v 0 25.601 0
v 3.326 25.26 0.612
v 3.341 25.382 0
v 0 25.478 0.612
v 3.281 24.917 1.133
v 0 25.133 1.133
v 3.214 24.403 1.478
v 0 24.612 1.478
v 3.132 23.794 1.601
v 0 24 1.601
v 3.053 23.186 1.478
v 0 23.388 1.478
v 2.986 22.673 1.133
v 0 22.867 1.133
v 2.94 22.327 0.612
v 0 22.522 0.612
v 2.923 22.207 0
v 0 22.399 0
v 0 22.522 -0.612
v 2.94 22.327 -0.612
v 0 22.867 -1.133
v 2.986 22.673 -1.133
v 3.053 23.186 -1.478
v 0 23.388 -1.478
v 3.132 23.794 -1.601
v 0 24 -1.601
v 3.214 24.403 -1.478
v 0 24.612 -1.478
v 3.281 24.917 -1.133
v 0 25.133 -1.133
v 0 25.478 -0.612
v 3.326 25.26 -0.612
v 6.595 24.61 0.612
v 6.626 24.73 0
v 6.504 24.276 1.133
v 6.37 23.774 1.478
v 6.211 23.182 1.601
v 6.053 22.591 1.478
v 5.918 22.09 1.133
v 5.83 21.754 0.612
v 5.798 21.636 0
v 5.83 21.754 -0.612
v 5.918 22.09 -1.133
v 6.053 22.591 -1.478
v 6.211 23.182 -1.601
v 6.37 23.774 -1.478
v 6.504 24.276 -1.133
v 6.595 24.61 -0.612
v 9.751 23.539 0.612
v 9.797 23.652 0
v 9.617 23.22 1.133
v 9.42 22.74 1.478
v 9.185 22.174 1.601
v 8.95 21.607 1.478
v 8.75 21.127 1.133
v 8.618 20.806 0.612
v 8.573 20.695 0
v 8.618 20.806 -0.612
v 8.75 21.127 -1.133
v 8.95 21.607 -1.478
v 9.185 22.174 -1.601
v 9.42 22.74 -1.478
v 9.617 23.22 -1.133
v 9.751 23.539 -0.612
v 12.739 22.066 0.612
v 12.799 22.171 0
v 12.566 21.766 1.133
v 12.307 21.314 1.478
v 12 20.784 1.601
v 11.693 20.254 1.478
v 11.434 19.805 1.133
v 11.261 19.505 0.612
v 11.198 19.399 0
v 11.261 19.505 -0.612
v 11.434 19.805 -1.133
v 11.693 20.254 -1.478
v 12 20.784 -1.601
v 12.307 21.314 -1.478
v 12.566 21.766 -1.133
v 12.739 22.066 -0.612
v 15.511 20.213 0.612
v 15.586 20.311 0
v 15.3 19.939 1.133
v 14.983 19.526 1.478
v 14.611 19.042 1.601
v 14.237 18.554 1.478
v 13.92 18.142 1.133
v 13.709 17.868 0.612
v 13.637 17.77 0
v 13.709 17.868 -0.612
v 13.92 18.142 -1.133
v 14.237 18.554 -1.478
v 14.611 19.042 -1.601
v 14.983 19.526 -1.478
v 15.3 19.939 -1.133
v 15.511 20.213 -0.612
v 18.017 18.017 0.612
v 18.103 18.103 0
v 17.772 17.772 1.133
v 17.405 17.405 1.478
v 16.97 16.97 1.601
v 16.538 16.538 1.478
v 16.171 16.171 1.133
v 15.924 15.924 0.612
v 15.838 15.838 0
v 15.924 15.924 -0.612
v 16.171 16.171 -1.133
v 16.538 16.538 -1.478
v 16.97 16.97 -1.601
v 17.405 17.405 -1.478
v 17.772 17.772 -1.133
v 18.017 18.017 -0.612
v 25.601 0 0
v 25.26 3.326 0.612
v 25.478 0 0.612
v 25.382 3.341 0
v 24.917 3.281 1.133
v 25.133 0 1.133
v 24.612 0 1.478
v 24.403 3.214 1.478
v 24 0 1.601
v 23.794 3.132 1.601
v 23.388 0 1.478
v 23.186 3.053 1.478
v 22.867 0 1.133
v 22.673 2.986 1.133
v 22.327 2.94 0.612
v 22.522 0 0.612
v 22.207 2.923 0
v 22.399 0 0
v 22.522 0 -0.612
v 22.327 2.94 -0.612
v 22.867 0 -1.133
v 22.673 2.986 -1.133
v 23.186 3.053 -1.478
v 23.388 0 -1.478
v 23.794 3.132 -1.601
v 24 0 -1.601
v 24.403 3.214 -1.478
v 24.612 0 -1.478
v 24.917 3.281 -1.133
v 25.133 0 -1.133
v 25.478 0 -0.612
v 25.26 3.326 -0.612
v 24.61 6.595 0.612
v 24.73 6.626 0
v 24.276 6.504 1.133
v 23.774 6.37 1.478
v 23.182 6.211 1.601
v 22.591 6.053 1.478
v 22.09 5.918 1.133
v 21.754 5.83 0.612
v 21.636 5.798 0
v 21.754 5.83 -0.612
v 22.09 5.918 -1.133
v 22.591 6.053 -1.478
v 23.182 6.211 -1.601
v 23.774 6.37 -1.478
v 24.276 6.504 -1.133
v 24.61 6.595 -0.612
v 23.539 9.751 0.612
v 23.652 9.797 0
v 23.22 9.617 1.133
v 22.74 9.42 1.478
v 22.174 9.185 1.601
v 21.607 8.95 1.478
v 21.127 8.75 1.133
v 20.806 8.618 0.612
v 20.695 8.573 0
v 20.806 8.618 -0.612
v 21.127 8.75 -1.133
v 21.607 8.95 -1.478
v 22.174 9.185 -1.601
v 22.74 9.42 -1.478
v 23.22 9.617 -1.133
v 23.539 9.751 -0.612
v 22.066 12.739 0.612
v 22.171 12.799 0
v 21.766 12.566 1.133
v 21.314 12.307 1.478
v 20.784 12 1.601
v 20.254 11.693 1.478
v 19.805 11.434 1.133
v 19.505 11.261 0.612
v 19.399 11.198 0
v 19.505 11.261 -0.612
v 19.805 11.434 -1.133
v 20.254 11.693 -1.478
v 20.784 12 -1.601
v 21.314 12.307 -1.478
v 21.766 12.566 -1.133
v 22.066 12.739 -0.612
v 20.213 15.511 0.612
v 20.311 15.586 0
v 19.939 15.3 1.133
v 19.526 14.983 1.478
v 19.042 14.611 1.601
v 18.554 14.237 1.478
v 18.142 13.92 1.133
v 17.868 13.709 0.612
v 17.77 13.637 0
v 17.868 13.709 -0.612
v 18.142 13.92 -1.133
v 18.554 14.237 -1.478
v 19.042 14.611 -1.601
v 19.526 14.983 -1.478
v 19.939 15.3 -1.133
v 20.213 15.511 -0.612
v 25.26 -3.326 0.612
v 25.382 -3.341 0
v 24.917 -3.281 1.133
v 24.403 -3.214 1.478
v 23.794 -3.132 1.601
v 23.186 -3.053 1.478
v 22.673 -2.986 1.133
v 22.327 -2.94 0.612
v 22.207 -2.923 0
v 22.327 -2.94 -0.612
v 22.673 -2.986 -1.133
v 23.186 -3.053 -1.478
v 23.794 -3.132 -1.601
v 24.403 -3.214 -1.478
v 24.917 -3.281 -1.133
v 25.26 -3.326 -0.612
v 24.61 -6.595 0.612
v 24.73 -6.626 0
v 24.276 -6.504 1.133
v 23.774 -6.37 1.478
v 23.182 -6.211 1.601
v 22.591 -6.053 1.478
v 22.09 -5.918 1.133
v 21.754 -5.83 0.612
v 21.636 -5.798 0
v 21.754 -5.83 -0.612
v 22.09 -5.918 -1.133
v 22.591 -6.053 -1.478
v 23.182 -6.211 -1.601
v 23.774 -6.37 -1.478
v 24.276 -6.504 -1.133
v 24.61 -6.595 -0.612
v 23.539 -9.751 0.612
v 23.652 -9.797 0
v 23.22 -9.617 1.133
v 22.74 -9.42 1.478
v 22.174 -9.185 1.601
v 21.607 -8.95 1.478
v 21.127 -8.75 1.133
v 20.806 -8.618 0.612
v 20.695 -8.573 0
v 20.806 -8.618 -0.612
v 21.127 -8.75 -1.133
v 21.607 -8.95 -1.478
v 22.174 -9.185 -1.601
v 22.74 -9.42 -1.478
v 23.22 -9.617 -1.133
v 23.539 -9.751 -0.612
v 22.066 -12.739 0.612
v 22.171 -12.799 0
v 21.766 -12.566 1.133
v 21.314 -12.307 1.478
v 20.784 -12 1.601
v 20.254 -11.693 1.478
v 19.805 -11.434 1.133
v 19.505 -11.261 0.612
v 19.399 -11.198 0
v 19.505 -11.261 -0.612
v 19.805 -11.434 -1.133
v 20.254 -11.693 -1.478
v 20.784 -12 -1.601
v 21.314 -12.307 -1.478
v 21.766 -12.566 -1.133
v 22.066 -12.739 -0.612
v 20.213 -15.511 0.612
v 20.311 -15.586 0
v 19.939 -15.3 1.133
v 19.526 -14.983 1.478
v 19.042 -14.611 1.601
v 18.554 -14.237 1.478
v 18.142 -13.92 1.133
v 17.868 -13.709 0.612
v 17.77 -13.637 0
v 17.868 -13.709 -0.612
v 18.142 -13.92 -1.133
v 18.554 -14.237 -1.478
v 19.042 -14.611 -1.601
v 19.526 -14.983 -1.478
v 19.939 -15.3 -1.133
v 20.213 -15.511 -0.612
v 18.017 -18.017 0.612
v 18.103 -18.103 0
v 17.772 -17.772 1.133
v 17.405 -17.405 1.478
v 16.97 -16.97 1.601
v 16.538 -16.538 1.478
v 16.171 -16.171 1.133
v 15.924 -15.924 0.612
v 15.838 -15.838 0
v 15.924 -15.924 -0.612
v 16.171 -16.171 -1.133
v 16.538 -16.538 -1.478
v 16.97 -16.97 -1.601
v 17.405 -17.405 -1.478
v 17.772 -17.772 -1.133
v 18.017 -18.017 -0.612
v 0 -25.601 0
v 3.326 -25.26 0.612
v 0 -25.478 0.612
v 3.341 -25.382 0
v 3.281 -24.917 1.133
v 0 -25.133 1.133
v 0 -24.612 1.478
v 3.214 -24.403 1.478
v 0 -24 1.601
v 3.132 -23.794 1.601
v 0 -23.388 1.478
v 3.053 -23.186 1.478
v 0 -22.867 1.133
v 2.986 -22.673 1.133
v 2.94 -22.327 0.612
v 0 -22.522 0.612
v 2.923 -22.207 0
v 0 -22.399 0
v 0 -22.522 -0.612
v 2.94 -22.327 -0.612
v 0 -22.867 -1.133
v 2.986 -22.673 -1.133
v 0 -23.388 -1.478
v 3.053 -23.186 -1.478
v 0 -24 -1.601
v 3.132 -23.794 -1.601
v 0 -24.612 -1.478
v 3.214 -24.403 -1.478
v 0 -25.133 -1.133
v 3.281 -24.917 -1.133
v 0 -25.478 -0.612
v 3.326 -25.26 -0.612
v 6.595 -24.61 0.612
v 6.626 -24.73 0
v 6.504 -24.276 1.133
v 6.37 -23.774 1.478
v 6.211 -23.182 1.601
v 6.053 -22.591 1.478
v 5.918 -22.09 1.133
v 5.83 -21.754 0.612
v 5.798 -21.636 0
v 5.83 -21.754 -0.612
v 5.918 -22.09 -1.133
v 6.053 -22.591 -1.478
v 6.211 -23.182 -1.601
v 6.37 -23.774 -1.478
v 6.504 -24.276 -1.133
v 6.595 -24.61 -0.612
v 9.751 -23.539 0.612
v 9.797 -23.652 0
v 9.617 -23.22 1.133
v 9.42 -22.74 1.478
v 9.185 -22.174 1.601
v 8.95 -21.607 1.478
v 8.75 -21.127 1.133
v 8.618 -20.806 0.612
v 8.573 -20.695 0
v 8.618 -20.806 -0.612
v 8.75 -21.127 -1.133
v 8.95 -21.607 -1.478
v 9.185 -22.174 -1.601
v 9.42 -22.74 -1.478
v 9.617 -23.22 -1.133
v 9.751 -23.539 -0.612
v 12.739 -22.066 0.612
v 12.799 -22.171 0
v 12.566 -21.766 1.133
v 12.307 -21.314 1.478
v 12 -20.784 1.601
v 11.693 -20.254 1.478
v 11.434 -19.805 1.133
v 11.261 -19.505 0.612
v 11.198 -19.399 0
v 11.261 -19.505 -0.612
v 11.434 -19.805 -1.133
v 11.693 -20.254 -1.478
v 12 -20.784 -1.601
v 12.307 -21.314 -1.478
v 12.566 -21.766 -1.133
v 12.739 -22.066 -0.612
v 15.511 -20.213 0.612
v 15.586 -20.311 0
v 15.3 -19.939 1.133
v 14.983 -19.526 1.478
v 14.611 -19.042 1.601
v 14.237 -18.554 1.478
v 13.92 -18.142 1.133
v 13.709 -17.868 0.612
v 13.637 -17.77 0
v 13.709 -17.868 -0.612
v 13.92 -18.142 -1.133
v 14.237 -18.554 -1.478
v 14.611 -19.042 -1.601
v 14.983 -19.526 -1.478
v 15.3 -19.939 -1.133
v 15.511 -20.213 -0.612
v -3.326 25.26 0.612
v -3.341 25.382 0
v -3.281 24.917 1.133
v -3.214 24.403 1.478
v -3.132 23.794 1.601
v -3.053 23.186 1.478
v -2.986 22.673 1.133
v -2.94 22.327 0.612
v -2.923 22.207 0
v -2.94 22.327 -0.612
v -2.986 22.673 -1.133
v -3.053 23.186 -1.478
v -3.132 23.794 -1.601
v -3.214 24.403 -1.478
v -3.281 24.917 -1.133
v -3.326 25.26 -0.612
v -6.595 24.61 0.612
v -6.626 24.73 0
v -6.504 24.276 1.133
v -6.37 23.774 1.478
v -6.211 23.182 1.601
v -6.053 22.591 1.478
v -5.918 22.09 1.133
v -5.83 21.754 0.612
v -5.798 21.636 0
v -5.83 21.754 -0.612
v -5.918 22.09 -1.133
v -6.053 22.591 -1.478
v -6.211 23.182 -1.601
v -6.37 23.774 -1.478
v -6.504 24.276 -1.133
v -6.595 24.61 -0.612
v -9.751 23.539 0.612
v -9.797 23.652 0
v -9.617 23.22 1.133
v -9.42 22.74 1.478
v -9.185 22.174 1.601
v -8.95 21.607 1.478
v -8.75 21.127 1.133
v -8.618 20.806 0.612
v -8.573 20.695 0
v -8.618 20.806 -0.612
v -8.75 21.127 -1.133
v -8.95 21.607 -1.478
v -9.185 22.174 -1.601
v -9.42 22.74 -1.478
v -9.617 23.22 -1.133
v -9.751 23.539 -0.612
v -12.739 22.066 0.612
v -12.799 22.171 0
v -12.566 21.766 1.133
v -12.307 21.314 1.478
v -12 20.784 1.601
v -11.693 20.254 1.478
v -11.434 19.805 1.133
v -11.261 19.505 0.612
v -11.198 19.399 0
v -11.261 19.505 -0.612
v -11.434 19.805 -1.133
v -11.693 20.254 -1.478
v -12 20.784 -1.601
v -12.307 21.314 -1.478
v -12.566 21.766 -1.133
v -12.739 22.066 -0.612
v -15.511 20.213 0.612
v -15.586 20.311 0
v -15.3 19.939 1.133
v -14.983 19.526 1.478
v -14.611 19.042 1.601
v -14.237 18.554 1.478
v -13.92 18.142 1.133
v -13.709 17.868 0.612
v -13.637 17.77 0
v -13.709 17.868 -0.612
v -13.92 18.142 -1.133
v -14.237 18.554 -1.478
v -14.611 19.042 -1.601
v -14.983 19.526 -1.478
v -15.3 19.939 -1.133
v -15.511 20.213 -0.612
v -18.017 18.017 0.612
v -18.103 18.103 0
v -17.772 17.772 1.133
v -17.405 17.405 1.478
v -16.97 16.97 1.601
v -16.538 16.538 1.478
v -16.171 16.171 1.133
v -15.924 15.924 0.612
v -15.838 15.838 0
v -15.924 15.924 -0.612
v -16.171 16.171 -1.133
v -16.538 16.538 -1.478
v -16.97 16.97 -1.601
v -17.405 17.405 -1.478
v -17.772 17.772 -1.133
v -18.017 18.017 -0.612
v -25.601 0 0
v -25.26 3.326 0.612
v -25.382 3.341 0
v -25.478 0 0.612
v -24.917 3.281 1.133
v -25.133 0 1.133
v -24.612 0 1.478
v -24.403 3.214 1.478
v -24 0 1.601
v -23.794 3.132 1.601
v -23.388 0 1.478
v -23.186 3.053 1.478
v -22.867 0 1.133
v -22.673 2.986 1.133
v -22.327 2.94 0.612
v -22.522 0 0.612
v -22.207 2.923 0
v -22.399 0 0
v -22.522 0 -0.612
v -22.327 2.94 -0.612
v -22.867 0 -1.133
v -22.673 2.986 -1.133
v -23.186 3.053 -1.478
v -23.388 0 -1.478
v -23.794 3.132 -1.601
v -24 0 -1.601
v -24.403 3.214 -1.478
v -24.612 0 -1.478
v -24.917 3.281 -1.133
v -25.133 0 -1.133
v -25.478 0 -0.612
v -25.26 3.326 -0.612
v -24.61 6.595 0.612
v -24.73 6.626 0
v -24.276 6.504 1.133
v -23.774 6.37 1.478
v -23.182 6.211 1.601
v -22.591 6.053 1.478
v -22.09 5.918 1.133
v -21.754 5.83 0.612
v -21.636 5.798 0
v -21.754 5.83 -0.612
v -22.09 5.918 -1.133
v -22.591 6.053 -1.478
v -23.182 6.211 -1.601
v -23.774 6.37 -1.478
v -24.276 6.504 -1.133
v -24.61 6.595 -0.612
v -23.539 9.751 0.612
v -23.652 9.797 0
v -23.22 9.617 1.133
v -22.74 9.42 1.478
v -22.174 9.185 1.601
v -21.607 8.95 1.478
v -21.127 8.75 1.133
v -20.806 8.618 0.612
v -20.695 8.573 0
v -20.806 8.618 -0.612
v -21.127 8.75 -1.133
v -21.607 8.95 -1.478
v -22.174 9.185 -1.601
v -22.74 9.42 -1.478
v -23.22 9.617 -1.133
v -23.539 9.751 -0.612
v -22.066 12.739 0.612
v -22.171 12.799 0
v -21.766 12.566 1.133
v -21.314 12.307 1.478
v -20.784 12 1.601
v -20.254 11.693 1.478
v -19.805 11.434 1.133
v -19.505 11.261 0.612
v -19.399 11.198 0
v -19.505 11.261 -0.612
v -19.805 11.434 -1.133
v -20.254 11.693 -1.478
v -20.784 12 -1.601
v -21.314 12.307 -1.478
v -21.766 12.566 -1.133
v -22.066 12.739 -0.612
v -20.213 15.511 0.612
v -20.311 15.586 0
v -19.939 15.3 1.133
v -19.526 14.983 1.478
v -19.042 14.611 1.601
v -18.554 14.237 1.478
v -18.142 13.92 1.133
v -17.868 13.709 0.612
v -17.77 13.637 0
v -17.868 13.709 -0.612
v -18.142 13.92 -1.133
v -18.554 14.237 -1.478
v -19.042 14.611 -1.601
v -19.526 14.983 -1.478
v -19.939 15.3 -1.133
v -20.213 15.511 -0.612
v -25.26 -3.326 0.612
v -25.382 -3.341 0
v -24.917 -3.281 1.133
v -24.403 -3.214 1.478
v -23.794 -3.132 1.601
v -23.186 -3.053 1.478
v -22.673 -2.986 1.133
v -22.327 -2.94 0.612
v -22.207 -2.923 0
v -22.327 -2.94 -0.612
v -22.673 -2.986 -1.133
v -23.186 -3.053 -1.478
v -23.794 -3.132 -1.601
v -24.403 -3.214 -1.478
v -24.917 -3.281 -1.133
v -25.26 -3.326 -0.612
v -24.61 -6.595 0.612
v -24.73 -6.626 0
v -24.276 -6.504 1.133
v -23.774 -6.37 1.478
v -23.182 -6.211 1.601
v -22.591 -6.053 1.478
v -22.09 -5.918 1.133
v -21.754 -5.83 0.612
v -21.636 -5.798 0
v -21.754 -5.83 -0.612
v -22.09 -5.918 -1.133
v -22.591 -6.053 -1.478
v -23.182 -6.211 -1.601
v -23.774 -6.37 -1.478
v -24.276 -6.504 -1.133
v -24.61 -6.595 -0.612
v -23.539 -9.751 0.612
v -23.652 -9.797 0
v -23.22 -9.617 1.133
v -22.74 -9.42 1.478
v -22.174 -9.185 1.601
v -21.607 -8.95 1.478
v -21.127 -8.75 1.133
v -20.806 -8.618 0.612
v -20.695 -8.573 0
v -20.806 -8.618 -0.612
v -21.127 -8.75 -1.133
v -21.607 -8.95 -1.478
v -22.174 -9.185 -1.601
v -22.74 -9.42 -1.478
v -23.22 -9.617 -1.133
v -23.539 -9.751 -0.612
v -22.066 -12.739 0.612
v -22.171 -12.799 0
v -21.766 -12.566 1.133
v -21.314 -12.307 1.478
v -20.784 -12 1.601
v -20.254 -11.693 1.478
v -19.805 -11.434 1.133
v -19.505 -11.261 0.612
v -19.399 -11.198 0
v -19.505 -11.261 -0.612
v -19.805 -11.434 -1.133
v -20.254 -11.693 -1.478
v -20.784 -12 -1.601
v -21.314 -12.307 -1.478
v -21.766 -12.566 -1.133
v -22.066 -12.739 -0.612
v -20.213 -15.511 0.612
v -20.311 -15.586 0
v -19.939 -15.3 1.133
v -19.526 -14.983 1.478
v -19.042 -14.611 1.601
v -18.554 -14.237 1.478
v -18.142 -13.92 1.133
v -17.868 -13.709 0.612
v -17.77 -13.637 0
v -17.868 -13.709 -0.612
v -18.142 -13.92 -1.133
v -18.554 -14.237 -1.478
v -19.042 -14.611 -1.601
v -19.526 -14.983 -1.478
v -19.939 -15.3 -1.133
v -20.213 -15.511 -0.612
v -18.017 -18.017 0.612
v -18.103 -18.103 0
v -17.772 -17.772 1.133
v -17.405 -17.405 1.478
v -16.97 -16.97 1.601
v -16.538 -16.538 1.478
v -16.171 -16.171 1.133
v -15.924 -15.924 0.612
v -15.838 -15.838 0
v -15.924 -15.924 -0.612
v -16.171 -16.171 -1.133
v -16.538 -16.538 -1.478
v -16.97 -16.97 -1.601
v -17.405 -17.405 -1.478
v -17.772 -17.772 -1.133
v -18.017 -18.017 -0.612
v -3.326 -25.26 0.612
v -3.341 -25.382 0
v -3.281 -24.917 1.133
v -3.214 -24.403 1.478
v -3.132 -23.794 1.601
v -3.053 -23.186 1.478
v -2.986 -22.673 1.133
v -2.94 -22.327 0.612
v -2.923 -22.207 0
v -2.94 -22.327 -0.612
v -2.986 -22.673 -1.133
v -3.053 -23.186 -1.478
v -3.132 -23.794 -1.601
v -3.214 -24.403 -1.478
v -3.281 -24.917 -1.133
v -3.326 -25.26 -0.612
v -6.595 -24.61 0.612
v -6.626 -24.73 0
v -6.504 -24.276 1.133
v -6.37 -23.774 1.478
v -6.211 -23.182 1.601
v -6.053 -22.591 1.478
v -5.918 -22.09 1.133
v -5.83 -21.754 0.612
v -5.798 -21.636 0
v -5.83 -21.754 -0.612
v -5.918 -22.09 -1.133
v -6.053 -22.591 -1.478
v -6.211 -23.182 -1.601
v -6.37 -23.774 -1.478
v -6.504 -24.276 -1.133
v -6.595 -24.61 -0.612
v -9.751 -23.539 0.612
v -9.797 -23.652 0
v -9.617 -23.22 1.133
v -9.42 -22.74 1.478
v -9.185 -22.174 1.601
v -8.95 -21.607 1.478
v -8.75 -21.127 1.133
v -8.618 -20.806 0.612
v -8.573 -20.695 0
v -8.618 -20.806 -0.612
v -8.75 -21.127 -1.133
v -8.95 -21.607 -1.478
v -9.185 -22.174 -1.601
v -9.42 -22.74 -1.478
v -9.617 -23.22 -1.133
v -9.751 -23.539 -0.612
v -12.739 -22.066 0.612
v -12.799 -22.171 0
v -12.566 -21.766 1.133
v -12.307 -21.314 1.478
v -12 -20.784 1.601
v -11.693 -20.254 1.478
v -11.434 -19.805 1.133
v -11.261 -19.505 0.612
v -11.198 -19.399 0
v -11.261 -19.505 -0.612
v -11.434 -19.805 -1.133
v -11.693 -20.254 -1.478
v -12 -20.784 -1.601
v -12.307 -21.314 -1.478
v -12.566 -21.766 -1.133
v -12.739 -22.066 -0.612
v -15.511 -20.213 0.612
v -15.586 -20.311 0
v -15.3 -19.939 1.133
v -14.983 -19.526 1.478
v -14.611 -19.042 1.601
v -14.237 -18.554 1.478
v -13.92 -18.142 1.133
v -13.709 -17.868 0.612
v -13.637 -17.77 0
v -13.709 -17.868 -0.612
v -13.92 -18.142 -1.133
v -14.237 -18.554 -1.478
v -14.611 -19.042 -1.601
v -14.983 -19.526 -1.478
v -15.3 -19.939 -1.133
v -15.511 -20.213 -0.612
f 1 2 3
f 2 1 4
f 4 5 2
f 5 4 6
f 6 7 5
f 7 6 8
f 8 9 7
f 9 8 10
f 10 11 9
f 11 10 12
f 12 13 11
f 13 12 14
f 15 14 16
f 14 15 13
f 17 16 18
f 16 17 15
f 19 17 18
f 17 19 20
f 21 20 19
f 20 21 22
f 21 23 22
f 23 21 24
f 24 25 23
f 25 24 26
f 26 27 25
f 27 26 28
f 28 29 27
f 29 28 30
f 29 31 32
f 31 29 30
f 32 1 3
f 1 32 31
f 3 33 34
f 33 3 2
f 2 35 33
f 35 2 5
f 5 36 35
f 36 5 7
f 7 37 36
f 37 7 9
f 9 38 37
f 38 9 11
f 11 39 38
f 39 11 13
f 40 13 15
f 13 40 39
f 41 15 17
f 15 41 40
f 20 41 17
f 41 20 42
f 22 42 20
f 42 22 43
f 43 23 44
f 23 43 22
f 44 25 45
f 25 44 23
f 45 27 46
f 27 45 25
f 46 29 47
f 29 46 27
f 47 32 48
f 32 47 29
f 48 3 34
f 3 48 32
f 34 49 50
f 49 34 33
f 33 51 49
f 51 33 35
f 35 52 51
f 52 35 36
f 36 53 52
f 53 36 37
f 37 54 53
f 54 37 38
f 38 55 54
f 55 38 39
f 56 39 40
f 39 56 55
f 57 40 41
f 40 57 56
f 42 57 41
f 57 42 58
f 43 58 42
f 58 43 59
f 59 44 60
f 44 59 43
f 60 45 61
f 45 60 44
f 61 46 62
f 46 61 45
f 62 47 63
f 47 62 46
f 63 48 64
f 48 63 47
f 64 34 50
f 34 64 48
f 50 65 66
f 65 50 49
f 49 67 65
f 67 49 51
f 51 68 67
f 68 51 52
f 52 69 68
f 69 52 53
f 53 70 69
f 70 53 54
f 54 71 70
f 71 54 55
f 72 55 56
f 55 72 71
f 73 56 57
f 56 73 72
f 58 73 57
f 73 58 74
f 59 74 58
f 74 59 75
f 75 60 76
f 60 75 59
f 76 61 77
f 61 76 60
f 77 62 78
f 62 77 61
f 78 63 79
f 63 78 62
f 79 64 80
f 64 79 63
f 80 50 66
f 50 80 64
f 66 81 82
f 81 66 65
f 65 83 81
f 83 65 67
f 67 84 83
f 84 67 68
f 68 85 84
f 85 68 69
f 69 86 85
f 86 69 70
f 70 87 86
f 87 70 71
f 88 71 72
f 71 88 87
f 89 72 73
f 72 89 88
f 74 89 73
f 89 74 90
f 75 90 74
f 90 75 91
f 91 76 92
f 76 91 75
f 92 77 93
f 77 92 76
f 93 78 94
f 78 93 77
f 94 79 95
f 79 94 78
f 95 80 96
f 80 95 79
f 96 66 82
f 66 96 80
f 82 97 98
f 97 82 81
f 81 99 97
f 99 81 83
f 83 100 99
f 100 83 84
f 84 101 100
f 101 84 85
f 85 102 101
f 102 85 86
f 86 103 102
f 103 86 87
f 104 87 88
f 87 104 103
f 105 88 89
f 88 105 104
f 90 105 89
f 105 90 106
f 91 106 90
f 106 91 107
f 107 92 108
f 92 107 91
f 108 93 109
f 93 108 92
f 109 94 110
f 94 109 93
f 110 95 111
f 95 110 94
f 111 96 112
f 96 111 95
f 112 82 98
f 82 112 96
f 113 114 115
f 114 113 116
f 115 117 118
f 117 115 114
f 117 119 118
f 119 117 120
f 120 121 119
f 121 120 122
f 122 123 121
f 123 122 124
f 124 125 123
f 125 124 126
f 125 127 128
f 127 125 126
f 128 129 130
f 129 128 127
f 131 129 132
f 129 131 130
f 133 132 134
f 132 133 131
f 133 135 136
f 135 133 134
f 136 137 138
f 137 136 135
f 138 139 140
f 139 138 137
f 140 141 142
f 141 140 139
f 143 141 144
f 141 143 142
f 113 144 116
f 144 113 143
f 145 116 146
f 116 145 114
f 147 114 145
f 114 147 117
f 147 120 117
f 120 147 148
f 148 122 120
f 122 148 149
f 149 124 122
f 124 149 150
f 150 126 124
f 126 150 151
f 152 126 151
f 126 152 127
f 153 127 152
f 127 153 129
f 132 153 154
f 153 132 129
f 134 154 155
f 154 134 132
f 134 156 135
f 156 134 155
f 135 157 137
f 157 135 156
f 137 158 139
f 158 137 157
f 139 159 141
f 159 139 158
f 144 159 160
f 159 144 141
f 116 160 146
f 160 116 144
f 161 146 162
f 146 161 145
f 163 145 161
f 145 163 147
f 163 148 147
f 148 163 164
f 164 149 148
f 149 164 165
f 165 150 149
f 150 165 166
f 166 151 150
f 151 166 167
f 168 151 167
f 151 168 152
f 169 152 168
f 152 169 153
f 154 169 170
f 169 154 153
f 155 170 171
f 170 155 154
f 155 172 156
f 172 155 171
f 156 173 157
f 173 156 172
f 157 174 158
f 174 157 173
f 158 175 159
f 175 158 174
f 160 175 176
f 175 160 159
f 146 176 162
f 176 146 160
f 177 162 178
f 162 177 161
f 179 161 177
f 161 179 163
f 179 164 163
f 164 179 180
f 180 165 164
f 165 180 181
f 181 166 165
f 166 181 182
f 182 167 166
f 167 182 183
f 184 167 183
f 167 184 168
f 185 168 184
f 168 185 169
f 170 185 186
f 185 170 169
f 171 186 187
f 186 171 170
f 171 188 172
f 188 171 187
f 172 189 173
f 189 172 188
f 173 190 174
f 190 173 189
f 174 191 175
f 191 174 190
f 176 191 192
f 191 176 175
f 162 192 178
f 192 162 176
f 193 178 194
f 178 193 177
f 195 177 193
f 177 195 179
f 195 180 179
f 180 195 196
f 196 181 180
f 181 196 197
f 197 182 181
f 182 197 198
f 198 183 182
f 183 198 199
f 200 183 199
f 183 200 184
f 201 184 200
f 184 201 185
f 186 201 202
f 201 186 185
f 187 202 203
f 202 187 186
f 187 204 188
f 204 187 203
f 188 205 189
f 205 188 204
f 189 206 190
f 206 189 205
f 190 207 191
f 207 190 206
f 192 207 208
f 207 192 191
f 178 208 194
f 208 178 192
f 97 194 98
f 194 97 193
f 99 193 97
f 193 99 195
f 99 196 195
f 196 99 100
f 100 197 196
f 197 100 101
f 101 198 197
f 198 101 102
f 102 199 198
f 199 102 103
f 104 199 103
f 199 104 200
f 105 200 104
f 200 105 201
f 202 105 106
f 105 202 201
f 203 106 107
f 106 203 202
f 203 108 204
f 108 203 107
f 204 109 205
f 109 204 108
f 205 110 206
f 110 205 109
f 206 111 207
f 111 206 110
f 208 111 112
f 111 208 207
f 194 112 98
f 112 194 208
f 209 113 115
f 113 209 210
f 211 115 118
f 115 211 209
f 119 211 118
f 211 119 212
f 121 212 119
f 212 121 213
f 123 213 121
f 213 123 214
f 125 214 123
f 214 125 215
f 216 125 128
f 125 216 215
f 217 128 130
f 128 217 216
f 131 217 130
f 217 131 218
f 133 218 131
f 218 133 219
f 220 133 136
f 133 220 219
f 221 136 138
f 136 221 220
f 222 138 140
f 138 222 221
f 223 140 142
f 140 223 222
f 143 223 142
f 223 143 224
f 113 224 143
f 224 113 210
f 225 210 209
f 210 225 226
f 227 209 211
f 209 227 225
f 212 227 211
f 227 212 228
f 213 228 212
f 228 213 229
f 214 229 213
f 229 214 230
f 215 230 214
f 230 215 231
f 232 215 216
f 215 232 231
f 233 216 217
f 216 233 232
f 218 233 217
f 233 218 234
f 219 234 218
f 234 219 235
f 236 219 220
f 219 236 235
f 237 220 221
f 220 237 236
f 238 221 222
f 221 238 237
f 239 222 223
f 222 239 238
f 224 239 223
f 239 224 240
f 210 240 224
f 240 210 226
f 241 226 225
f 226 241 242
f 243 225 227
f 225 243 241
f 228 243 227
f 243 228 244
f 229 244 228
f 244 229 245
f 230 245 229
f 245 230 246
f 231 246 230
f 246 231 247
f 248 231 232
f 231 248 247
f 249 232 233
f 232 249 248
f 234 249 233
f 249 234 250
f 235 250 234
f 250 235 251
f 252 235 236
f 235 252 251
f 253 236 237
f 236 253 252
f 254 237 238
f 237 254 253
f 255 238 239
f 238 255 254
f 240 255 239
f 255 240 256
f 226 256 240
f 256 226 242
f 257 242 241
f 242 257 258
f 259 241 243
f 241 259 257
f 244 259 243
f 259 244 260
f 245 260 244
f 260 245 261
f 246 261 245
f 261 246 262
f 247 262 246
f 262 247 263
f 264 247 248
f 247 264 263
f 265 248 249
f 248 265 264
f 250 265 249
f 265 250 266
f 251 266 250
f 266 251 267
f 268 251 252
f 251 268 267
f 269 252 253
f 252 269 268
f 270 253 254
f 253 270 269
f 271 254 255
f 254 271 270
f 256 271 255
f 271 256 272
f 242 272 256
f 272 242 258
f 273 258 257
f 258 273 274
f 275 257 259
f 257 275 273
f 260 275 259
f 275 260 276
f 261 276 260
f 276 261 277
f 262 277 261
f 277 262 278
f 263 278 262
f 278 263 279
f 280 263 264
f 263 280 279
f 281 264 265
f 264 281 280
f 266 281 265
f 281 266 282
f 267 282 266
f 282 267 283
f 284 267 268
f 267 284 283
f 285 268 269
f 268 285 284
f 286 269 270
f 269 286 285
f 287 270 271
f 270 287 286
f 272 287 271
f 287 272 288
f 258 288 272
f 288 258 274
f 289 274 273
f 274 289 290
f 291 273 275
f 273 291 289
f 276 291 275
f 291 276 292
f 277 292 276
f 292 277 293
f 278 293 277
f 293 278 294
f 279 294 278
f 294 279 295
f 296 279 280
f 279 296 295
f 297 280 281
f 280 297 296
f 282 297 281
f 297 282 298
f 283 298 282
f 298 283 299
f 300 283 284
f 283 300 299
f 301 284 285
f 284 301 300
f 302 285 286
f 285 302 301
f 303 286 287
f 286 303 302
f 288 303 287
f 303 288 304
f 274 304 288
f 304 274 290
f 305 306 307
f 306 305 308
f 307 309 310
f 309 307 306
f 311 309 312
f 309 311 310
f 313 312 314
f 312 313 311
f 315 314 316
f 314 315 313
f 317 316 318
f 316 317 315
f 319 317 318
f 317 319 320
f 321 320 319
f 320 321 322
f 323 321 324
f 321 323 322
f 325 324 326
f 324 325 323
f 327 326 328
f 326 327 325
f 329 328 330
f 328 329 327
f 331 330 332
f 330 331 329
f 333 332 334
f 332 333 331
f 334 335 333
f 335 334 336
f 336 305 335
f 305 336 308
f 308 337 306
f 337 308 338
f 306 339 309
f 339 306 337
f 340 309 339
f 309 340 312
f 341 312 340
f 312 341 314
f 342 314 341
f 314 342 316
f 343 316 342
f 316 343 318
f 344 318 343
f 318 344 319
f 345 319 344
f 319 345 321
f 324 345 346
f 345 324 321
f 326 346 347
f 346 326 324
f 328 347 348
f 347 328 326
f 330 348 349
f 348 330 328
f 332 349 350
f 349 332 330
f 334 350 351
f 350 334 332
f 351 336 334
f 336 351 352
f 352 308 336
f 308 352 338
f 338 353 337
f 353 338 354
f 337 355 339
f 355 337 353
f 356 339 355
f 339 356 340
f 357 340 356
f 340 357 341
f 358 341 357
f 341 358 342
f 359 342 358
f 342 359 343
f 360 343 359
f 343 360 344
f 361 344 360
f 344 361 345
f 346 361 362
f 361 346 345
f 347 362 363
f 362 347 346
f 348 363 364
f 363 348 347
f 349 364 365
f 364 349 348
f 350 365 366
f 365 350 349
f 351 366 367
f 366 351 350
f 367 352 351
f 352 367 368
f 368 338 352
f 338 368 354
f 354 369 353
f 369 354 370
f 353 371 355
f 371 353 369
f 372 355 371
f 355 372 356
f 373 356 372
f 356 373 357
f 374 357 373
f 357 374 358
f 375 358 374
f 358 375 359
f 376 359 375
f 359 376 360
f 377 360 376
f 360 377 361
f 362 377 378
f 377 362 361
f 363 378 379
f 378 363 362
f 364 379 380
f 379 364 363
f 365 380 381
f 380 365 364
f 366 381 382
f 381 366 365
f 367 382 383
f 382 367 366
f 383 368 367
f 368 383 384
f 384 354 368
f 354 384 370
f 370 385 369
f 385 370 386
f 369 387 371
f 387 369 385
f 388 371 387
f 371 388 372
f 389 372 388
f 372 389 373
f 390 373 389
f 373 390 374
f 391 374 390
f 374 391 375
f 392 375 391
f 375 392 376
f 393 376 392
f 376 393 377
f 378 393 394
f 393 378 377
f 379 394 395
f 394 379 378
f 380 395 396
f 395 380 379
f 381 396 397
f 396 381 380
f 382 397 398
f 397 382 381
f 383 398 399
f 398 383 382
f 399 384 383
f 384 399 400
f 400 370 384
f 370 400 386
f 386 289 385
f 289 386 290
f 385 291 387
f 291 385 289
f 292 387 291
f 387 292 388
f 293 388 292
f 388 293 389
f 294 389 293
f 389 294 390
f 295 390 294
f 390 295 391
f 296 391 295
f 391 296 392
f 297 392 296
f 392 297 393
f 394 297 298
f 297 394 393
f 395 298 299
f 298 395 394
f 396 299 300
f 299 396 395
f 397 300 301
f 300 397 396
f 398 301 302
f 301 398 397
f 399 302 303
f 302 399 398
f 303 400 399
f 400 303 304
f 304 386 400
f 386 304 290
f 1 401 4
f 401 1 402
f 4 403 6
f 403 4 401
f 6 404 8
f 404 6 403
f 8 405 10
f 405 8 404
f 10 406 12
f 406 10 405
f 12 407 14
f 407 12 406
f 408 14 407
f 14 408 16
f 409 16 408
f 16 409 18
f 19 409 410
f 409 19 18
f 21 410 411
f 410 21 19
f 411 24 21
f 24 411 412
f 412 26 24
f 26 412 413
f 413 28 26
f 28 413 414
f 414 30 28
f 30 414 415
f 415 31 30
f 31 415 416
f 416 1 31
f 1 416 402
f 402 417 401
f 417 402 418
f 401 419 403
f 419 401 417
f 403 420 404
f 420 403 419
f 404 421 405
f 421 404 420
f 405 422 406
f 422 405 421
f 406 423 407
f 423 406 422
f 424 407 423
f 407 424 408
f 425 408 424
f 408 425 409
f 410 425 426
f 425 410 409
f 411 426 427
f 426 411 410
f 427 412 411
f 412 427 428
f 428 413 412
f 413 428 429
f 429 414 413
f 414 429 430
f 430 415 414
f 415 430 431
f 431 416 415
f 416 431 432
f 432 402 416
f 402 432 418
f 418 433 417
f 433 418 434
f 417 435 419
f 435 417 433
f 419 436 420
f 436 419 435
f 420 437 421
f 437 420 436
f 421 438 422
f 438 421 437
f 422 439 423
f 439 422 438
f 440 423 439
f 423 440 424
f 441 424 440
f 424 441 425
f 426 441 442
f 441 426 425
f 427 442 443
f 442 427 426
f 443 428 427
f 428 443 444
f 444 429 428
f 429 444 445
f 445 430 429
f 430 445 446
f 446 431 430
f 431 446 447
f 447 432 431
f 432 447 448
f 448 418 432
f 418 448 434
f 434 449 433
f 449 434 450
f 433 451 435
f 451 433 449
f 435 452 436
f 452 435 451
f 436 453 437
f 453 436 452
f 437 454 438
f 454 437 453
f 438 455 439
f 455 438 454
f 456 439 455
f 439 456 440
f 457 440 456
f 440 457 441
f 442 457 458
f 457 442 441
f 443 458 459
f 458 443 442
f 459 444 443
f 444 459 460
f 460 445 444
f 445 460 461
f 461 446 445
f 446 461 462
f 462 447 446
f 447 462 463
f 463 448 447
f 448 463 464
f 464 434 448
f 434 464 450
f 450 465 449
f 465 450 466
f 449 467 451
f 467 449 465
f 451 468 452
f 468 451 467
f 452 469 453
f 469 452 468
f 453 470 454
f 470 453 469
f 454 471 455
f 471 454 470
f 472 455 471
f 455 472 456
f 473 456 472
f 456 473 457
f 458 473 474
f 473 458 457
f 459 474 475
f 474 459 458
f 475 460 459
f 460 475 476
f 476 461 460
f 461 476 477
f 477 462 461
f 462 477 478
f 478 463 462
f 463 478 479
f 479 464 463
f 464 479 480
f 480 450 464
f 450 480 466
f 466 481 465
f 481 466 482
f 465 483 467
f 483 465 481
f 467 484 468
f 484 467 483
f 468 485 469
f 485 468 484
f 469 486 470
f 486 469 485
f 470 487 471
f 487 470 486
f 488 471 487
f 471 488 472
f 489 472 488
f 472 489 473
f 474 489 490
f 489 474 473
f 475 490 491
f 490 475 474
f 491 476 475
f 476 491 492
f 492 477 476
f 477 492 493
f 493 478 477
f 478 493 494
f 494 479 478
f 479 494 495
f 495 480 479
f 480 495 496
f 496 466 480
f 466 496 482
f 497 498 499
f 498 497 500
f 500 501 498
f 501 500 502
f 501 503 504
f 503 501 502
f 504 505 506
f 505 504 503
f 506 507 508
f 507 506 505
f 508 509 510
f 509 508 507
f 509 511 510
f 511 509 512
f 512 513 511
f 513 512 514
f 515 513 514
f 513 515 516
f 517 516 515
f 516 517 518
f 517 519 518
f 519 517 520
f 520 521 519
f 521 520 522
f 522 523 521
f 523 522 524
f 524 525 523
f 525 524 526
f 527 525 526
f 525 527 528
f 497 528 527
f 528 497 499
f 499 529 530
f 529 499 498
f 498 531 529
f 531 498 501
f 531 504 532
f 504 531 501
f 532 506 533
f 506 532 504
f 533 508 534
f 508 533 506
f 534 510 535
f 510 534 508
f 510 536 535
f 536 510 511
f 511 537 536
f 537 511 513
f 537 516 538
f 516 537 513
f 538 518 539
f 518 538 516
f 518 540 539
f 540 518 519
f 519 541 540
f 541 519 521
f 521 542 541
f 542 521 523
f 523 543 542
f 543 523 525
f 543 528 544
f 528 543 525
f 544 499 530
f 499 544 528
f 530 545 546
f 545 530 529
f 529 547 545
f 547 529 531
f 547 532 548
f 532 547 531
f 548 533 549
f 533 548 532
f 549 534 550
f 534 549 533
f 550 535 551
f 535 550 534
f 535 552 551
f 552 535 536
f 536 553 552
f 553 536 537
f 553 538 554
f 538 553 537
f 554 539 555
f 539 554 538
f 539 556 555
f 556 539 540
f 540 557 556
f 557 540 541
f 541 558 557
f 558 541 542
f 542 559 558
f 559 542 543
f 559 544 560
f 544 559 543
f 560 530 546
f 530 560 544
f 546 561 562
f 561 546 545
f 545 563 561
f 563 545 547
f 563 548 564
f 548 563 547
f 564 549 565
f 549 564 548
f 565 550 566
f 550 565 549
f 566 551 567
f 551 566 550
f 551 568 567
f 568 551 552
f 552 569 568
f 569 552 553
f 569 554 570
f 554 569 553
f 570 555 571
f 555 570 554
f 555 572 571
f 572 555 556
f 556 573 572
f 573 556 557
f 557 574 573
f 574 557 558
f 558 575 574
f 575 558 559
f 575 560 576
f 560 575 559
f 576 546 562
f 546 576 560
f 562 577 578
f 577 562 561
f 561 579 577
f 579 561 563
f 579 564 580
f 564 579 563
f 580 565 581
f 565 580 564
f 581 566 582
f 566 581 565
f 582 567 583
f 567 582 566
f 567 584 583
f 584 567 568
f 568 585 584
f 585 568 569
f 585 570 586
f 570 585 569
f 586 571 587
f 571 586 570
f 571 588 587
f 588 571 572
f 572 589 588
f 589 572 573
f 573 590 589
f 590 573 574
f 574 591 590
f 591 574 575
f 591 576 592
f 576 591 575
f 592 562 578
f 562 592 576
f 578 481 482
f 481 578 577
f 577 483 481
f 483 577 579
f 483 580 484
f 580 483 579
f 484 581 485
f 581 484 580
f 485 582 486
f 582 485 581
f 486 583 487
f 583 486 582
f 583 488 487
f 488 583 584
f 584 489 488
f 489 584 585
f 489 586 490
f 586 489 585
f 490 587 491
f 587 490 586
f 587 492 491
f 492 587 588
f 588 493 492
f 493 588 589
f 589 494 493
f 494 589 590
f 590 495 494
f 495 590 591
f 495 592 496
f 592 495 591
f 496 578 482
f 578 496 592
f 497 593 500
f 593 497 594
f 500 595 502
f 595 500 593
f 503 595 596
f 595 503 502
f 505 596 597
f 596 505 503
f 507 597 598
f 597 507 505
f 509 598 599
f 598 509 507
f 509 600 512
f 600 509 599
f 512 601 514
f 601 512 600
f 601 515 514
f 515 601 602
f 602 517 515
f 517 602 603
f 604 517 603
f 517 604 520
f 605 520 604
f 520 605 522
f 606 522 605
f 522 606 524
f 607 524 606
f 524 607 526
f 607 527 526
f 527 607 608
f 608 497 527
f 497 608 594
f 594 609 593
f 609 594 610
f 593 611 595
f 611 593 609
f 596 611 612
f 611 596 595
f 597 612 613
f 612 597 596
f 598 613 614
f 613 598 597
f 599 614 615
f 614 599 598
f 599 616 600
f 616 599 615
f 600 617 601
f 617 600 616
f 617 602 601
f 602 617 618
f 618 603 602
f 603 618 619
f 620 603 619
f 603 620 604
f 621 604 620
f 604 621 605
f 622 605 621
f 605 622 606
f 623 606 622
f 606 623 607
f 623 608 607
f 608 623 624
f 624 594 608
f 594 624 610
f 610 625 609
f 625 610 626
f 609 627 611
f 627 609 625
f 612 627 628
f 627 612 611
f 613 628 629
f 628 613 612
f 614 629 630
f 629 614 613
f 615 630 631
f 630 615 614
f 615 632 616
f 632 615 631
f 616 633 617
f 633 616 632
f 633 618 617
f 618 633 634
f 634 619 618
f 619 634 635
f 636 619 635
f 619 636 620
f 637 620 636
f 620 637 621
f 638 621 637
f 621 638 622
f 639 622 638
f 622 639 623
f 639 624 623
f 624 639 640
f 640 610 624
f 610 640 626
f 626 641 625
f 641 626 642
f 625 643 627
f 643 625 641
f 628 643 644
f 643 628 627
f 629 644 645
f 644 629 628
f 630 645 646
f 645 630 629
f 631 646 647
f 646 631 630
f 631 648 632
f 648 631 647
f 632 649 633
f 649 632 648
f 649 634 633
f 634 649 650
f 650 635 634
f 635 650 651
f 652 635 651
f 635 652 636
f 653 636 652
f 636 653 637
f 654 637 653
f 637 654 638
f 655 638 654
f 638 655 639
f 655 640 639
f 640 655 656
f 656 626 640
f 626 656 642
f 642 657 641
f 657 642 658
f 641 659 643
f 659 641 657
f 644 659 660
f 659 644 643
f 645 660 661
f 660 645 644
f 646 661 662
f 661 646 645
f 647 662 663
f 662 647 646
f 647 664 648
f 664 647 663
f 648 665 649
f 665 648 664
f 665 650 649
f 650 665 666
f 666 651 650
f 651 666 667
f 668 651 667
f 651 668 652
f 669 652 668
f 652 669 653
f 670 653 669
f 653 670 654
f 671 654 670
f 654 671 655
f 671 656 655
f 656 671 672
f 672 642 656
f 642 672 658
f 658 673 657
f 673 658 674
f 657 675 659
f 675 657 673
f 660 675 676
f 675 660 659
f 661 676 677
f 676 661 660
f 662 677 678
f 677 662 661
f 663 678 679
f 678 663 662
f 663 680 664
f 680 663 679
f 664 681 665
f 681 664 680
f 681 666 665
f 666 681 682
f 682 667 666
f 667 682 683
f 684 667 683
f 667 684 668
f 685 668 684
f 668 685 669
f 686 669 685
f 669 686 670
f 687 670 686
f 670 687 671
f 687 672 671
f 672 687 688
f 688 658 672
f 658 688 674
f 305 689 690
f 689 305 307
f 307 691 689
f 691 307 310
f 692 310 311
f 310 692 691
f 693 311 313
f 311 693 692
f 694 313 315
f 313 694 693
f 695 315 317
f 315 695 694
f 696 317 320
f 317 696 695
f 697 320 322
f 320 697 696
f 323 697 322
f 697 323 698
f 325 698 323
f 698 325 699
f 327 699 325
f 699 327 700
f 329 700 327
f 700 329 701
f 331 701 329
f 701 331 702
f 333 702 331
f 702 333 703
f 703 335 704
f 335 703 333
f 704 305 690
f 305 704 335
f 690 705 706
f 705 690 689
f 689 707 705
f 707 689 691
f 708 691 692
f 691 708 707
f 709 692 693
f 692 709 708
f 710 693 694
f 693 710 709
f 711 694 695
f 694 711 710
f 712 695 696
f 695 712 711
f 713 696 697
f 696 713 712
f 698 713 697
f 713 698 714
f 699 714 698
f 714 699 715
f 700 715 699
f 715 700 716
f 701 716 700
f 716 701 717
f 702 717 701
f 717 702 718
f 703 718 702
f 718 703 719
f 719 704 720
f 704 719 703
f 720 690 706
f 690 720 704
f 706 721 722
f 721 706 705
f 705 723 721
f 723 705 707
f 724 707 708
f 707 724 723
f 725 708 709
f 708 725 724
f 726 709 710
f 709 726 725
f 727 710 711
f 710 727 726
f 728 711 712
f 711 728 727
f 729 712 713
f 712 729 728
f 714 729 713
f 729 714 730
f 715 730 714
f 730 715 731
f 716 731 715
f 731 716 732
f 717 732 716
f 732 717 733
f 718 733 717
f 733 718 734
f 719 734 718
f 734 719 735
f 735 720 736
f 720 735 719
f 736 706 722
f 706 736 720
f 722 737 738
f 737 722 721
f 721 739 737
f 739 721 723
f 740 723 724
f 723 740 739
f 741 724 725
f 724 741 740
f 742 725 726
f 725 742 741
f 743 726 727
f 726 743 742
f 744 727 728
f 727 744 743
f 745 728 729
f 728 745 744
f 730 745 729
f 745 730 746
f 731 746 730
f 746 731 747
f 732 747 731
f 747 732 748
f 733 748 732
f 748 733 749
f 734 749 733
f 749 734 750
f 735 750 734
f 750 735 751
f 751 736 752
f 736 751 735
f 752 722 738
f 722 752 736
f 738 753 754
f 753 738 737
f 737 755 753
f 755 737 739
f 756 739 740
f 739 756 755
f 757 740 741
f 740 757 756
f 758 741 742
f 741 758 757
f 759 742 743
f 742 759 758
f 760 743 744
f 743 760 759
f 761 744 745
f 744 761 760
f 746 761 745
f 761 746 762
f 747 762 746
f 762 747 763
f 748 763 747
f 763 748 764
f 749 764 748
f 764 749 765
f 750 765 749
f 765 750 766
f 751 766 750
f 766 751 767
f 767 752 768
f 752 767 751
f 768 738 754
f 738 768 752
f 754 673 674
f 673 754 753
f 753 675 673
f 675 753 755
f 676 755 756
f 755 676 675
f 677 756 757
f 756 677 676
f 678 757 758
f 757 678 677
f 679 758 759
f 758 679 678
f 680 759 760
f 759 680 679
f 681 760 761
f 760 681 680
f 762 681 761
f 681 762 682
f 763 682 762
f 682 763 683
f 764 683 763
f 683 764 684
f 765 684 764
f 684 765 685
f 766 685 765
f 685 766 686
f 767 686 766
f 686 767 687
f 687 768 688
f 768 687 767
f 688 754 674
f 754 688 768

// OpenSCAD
use <../lib.scad>
use <../p/48/tm08q0667.scad>
function ldraw_lib__33160() = [
// 0 Hoop Shaped Bar 7 x 7
// 0 Name: 33160.dat
// 0 Author: Chris Böhnke [KnightOfTarenta]
// 0 !LDRAW_ORG Part UPDATE 2025-07
// 0 !LICENSE Licensed under CC BY 4.0 : see CAreadme.txt
// 
// 0 BFC CERTIFY CCW
  [0,"BFC","CERTIFY"],
  [0,"BFC","CCW"],
// 
// 0 !CATEGORY Belville
// 0 !KEYWORDS circle, Circus, Loop, Ring
// 
// 0 !HISTORY 2025-07-27 [OrionP] Official Update 2025-07
// 
// 1 16 0 0 0 0 0 60 0 -60 0 60 0 0 48\tm08q0667.dat
  [1,16,0,0,0,0,0,60,0,-60,0,60,0,0, ldraw_lib__48__tm08q0667()],
// 1 16 0 0 0 60 0 0 0 -60 0 0 0 60 48\tm08q0667.dat
  [1,16,0,0,0,60,0,0,0,-60,0,0,0,60, ldraw_lib__48__tm08q0667()],
// 1 16 0 0 0 60 0 0 0 -60 0 0 0 -60 48\tm08q0667.dat
  [1,16,0,0,0,60,0,0,0,-60,0,0,0,-60, ldraw_lib__48__tm08q0667()],
// 1 16 0 0 0 0 0 60 0 -60 0 -60 0 0 48\tm08q0667.dat
  [1,16,0,0,0,0,0,60,0,-60,0,-60,0,0, ldraw_lib__48__tm08q0667()],
// 1 16 0 0 0 0 0 -60 0 -60 0 60 0 0 48\tm08q0667.dat
  [1,16,0,0,0,0,0,-60,0,-60,0,60,0,0, ldraw_lib__48__tm08q0667()],
// 1 16 0 0 0 -60 0 0 0 -60 0 0 0 60 48\tm08q0667.dat
  [1,16,0,0,0,-60,0,0,0,-60,0,0,0,60, ldraw_lib__48__tm08q0667()],
// 1 16 0 0 0 -60 0 0 0 -60 0 0 0 -60 48\tm08q0667.dat
  [1,16,0,0,0,-60,0,0,0,-60,0,0,0,-60, ldraw_lib__48__tm08q0667()],
// 1 16 0 0 0 0 0 -60 0 -60 0 -60 0 0 48\tm08q0667.dat
  [1,16,0,0,0,0,0,-60,0,-60,0,-60,0,0, ldraw_lib__48__tm08q0667()],
];
module ldraw_lib__33160(step=0, col=false, unit=2/5, alt=false, line=0.2, solid=!$preview)
    makepoly(ldraw_lib__33160(), step=step, col=col, unit=unit, alt=alt, line=line, solid=solid);
ldraw_lib__33160(line=0.2);
